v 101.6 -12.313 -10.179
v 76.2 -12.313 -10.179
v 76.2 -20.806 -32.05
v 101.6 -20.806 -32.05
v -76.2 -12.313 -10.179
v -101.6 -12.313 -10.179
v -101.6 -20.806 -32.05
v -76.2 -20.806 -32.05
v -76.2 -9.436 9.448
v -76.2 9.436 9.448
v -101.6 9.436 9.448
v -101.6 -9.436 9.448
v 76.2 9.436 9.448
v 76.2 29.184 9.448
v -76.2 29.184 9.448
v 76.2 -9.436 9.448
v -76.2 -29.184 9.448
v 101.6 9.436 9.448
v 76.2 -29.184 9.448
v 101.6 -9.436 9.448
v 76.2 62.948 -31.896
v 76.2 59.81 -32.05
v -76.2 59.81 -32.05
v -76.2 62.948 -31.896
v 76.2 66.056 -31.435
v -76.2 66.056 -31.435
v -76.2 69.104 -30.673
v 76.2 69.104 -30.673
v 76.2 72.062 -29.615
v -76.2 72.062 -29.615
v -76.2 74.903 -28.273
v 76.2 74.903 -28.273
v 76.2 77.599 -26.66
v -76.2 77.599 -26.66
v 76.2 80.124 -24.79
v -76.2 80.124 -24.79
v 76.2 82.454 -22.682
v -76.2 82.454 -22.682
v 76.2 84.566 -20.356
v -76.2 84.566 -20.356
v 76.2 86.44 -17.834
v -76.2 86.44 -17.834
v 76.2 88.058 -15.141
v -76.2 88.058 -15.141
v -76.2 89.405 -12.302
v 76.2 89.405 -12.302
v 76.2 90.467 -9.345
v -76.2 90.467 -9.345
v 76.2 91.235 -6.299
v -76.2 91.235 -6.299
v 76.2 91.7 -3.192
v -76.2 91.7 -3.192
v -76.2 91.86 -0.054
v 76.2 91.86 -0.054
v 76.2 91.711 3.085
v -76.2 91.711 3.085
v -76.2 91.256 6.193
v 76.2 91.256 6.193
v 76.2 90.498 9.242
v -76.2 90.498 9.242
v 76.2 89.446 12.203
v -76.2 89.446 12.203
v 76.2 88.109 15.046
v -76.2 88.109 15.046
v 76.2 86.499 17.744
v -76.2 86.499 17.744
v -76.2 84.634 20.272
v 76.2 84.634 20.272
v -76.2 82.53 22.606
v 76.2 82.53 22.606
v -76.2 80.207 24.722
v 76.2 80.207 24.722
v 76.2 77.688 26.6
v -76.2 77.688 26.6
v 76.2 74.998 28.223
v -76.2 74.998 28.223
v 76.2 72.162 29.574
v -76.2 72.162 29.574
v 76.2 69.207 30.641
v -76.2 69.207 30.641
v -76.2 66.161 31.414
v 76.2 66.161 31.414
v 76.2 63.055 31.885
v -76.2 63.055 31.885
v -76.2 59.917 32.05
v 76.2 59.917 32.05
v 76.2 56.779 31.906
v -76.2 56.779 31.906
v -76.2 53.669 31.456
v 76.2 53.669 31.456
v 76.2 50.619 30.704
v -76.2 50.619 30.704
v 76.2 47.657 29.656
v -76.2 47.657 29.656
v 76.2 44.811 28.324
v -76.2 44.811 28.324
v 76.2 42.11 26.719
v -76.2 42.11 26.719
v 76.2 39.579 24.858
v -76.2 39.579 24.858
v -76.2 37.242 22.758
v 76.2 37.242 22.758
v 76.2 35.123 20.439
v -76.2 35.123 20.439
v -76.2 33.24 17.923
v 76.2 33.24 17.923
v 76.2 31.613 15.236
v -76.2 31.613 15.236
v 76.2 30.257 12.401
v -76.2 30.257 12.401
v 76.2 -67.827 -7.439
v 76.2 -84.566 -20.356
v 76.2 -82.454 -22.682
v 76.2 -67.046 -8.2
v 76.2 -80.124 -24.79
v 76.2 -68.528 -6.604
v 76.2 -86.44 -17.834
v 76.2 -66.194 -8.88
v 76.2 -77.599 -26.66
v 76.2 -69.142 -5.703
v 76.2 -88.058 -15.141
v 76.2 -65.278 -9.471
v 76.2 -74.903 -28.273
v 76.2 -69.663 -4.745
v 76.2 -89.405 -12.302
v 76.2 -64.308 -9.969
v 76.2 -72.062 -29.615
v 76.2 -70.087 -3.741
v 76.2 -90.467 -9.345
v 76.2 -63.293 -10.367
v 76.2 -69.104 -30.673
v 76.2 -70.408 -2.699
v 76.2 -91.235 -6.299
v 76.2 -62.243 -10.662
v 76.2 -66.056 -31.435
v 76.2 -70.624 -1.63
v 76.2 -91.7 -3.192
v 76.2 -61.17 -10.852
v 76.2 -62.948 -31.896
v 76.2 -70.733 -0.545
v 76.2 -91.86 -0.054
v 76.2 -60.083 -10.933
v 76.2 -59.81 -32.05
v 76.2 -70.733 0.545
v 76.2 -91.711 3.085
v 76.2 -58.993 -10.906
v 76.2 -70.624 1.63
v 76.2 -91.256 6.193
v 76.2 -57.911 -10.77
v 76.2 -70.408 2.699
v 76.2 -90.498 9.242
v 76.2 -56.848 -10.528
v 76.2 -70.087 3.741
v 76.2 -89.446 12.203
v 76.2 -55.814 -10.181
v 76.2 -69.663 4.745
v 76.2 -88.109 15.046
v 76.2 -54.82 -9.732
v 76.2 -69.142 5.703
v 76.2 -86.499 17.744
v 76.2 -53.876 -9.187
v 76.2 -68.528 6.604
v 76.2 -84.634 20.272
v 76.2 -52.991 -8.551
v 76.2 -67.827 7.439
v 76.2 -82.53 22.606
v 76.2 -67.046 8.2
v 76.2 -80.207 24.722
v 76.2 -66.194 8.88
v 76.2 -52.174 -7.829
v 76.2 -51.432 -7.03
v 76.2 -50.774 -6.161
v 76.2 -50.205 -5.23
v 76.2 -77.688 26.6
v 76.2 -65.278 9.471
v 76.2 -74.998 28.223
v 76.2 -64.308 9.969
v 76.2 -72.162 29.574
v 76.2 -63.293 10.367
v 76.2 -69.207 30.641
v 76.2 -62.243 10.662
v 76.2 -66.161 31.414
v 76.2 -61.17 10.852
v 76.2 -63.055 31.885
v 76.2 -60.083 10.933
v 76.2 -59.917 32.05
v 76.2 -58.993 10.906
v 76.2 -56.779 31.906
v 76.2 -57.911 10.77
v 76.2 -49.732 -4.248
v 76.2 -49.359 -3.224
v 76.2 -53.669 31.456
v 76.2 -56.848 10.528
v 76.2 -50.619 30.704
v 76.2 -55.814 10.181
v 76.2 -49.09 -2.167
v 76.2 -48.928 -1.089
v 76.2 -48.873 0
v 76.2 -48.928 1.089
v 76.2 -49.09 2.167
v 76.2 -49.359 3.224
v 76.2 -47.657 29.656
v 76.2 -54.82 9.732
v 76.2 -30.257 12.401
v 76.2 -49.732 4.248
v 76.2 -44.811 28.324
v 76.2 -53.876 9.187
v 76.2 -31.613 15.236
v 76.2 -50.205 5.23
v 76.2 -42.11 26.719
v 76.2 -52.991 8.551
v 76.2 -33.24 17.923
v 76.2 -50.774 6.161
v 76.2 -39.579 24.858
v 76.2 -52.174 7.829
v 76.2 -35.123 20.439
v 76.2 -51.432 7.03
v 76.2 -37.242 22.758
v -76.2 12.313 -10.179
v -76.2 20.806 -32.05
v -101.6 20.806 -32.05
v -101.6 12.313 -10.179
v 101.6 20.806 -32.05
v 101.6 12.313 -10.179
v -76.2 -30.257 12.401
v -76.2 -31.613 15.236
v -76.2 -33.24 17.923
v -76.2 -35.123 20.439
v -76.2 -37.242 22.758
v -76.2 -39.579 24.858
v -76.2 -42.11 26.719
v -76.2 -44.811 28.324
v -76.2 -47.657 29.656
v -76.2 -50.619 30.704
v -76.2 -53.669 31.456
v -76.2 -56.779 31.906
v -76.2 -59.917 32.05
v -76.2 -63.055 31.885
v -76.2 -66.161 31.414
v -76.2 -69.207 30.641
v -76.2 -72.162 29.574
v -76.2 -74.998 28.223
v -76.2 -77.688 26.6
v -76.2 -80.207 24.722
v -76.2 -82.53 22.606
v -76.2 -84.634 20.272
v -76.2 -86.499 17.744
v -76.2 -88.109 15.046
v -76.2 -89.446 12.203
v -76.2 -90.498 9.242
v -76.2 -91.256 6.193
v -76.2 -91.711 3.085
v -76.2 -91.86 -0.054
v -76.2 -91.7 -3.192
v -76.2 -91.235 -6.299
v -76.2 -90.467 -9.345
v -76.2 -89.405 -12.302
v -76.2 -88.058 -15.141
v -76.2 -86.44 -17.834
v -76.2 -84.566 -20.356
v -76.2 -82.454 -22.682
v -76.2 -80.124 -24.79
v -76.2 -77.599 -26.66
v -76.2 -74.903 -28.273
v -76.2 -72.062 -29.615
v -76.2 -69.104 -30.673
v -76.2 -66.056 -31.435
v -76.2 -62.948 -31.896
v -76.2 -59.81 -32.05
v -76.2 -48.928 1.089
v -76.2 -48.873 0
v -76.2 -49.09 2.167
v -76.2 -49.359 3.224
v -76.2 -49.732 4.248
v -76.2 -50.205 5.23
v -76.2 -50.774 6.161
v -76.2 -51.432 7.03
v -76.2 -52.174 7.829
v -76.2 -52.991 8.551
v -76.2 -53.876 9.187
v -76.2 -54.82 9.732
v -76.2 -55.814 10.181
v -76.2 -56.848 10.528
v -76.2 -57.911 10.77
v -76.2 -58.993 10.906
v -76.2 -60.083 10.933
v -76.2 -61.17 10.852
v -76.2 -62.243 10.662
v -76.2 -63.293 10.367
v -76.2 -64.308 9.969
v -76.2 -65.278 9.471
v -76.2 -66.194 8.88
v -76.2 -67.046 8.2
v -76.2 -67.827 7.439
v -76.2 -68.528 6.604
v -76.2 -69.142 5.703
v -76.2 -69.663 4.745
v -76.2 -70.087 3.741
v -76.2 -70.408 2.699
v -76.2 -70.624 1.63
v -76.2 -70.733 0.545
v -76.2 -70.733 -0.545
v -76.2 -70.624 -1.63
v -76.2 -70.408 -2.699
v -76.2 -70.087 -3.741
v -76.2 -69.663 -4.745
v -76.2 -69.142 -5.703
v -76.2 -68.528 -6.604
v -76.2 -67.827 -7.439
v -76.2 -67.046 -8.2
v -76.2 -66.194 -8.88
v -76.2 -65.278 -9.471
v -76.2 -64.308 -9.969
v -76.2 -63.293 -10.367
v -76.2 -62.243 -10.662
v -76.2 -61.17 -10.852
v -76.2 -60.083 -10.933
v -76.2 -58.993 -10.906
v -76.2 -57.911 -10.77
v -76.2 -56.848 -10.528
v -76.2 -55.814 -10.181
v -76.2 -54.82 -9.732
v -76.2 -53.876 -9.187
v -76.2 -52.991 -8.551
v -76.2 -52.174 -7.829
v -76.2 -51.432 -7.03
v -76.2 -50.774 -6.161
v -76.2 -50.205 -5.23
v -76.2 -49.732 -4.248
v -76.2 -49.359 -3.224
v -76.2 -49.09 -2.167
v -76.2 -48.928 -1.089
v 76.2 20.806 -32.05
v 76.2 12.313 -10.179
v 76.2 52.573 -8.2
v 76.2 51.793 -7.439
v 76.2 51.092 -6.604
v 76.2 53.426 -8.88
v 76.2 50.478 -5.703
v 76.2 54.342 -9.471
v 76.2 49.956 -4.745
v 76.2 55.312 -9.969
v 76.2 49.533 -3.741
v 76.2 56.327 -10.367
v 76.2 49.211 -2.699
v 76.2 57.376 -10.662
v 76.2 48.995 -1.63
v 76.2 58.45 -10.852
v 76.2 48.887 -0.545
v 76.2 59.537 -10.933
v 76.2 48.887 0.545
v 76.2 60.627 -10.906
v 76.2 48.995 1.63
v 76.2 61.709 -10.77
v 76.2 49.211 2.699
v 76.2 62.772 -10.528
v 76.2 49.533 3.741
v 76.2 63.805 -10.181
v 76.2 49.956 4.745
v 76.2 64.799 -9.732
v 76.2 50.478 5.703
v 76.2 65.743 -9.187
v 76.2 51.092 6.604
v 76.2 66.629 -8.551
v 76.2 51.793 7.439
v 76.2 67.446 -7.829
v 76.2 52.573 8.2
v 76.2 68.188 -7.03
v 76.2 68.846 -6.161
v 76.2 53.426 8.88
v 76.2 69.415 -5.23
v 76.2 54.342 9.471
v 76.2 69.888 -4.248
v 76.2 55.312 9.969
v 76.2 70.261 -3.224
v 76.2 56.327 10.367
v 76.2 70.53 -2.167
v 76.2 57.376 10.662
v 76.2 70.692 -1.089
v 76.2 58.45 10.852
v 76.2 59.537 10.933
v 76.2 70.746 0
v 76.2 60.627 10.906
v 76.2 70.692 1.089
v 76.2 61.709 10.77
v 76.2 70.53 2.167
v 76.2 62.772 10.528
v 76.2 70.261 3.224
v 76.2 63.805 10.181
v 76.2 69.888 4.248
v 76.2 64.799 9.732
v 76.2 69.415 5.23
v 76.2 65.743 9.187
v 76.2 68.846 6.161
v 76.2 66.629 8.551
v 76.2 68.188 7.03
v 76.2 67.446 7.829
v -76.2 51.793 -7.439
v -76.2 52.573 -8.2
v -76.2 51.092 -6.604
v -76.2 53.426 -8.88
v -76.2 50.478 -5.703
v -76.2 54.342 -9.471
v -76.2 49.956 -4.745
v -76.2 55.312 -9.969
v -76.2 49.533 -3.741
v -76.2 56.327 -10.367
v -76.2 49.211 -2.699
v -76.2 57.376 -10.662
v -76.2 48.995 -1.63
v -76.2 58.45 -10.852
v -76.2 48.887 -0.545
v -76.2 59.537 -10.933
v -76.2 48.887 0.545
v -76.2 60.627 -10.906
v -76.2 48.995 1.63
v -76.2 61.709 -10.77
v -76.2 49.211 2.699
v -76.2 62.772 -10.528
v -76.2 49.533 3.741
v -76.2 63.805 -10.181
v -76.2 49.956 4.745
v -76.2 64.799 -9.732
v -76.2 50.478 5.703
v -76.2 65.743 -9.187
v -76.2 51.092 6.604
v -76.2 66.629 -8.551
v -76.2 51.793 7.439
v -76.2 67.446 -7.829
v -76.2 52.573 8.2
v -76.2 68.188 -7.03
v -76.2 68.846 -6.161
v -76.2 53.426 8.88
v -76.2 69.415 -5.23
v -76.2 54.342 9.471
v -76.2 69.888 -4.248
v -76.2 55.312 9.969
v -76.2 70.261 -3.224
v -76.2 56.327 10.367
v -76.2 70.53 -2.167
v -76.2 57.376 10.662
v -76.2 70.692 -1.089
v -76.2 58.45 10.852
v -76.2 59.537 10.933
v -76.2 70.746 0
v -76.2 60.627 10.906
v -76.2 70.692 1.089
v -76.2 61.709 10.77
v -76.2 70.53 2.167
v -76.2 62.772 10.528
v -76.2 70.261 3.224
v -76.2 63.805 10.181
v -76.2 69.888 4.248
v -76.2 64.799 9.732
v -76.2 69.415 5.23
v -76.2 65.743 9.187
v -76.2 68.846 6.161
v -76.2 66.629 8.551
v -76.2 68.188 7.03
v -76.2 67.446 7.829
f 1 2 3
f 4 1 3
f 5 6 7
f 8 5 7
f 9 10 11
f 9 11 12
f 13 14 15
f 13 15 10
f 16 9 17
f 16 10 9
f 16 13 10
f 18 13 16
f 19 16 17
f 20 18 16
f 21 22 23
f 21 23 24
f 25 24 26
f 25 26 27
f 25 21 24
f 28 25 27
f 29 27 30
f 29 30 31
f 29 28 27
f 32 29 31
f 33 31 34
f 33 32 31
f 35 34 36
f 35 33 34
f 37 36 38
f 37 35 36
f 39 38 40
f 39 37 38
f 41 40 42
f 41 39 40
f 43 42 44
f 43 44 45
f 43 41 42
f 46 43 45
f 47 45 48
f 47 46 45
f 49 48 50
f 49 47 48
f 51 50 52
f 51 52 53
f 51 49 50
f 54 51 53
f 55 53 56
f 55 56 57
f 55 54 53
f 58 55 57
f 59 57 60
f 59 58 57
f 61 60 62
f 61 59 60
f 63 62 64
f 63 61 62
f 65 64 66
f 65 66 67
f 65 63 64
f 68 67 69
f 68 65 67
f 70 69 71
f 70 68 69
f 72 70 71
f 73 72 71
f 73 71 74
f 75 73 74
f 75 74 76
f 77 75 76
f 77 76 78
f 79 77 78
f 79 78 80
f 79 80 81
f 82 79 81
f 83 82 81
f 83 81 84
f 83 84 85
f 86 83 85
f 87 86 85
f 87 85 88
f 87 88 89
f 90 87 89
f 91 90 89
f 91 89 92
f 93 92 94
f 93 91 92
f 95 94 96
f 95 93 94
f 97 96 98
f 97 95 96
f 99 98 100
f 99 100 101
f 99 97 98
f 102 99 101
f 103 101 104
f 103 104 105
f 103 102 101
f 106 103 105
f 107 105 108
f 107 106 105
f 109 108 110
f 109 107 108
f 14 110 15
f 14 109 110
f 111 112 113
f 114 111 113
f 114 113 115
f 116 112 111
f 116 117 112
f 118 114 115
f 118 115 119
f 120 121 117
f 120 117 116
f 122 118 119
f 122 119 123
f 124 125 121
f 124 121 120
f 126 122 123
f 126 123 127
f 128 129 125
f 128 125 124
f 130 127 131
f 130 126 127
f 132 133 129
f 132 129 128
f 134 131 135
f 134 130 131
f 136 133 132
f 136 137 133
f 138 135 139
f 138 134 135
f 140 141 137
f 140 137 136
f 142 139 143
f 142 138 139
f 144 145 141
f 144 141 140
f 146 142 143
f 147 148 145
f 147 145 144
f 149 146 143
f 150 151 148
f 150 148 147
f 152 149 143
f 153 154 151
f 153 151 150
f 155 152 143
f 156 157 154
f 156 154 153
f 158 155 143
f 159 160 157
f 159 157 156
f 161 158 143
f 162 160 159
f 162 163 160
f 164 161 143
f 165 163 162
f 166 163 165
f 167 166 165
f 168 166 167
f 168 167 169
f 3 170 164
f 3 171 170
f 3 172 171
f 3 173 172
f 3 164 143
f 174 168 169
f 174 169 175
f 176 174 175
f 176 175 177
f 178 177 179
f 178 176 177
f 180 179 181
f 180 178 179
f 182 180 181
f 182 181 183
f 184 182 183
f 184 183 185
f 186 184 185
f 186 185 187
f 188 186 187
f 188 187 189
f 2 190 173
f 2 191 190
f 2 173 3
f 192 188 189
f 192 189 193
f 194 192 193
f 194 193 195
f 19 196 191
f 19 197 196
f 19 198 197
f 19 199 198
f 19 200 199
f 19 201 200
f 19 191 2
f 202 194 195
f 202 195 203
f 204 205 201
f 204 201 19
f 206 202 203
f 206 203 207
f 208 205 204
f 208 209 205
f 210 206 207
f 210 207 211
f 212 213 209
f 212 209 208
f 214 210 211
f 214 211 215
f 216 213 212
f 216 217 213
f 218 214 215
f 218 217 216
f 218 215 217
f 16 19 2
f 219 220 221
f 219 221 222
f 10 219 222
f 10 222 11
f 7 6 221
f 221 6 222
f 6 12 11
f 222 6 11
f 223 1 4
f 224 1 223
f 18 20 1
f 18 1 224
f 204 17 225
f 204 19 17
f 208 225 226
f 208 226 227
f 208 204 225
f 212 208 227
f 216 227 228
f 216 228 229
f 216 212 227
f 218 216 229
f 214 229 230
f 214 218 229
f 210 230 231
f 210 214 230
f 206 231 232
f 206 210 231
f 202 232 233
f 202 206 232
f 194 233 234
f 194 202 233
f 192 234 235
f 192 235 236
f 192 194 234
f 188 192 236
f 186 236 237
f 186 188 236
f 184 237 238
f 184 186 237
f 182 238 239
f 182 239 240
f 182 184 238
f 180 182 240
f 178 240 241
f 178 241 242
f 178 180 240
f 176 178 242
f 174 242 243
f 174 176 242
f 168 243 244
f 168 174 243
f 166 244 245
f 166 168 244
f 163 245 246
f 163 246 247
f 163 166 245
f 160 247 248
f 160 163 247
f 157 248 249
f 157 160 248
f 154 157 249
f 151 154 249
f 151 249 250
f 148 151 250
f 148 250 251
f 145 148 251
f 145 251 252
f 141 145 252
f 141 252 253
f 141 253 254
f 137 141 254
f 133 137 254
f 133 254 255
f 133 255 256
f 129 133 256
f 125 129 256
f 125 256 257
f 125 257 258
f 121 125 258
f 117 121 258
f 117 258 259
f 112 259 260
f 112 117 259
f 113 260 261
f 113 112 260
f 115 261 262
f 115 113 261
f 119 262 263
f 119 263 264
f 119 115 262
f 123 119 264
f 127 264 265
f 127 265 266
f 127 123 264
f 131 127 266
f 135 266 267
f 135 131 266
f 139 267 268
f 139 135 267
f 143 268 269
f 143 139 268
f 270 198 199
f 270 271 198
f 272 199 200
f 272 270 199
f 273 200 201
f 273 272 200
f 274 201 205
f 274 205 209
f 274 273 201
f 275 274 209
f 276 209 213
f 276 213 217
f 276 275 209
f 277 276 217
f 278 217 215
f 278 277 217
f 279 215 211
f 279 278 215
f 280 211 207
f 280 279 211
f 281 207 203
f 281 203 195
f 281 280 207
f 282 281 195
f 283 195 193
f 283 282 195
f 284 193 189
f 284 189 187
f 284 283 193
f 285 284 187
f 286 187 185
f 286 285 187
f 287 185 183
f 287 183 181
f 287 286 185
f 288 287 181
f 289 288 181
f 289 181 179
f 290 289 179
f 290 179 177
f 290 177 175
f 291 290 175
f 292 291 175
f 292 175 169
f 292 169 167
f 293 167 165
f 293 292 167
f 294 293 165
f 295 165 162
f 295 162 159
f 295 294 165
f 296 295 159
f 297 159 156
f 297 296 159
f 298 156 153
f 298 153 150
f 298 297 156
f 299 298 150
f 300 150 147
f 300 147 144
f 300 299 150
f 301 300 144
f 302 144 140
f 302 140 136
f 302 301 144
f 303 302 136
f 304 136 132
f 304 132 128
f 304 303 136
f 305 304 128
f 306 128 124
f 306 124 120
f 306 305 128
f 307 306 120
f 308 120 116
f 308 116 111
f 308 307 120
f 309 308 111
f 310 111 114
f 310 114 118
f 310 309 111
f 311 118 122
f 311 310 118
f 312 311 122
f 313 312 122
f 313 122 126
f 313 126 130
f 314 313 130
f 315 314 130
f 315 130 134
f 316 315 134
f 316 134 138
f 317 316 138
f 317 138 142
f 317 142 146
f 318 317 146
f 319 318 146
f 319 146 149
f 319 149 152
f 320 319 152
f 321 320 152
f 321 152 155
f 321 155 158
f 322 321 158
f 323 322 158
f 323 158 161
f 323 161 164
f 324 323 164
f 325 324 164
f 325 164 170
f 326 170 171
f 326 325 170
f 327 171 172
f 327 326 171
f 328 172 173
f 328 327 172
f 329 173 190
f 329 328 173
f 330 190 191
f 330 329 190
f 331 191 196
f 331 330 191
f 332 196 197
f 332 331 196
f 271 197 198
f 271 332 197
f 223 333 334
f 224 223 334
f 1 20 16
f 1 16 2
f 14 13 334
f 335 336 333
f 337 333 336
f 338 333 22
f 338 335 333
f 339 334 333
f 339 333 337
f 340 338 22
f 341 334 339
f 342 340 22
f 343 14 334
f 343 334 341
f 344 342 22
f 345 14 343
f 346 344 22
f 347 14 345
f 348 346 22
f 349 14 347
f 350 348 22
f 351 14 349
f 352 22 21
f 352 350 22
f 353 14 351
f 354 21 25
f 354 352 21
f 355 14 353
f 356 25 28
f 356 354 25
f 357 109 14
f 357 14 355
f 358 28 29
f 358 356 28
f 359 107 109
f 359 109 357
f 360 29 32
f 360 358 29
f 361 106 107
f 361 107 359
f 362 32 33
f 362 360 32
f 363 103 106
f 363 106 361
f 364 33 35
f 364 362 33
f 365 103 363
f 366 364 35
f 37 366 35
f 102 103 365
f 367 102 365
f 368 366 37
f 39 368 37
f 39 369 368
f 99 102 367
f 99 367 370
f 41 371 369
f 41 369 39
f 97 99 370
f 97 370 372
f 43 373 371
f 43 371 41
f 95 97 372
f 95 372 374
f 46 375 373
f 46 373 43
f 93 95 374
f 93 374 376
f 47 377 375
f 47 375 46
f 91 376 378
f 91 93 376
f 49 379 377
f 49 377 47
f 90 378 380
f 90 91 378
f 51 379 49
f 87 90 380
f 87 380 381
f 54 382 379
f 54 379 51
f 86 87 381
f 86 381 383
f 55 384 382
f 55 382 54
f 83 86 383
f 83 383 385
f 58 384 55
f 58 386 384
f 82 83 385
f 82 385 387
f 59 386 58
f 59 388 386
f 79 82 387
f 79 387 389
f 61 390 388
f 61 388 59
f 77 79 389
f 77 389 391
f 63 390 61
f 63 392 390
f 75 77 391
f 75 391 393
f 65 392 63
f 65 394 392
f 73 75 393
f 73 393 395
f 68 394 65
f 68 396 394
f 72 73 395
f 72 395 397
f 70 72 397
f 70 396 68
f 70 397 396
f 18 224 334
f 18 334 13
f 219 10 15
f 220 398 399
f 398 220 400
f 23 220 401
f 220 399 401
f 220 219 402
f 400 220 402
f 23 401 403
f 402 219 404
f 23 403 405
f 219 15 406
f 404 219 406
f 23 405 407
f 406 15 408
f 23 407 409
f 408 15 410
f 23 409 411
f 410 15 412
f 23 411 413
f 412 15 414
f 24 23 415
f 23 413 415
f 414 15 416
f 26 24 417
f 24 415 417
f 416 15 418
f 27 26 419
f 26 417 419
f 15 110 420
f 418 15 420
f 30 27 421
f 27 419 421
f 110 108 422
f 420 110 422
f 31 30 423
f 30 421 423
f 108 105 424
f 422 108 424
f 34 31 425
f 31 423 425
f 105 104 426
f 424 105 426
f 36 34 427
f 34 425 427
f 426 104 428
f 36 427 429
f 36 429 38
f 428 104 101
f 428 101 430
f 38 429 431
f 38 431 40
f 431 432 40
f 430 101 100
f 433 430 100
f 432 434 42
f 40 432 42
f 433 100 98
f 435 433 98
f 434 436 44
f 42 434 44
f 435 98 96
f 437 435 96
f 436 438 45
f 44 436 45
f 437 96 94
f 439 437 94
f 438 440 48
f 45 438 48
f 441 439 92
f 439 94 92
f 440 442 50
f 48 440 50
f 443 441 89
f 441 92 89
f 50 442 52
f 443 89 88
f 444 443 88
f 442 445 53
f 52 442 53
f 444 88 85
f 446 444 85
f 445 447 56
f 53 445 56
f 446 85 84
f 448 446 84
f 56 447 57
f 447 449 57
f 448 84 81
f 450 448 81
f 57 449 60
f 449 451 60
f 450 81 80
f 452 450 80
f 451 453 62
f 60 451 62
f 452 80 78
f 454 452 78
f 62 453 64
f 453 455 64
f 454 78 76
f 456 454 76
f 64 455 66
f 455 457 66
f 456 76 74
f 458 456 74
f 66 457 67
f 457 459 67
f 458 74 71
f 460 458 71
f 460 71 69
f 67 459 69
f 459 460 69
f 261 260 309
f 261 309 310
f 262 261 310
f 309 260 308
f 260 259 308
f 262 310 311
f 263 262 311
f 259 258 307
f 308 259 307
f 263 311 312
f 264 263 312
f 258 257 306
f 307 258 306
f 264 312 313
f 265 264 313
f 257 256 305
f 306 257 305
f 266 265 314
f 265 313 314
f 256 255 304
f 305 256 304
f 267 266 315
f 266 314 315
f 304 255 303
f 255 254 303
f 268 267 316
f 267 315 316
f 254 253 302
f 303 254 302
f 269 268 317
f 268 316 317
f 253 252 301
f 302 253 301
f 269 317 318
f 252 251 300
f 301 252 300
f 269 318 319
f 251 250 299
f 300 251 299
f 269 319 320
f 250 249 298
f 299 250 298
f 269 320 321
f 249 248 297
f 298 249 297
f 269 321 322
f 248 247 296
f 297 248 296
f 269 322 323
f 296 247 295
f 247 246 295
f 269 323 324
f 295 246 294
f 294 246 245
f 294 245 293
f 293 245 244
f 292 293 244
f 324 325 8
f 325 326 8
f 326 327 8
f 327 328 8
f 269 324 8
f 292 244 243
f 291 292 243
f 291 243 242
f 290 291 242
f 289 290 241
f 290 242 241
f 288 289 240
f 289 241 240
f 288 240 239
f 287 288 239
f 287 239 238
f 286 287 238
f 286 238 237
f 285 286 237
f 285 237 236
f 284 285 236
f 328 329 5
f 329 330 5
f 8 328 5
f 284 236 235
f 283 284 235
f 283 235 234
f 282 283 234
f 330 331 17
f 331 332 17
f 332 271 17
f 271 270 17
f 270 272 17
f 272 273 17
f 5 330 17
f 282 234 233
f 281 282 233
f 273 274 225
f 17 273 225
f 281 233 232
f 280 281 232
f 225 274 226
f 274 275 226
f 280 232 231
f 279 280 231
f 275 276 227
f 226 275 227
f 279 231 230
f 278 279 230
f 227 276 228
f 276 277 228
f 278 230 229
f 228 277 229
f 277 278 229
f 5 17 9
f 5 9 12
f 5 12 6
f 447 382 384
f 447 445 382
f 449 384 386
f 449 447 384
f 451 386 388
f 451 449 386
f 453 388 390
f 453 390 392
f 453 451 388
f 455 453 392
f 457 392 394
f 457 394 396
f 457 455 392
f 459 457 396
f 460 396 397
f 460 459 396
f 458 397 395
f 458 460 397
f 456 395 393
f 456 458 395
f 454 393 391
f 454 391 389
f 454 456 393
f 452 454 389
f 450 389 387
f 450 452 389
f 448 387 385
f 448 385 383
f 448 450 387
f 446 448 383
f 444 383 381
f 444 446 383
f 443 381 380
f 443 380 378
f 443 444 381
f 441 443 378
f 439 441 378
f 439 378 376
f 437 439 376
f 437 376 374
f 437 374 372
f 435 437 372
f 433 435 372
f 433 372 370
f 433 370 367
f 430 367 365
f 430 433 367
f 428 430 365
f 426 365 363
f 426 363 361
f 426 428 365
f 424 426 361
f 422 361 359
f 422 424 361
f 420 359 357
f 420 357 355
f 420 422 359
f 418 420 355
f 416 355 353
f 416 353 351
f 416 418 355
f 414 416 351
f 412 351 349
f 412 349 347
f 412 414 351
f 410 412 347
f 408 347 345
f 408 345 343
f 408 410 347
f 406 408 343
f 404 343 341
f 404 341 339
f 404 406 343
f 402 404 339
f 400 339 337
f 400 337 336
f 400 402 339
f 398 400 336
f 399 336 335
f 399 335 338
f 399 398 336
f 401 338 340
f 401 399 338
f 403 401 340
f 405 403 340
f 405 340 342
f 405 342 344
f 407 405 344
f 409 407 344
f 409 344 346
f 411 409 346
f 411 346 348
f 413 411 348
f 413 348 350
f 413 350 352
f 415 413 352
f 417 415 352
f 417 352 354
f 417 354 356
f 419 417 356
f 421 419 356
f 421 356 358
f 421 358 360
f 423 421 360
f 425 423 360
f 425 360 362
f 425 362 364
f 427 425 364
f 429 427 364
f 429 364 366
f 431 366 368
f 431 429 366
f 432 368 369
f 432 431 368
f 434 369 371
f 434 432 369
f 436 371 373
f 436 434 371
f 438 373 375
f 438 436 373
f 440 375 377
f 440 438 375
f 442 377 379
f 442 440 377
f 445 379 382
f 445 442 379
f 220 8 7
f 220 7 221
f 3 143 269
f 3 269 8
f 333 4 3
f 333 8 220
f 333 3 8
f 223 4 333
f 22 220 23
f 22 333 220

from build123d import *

# Parameters (mm, degrees)
F0_R     = 10.93658
F1_DEPTH = 76.2
F2_DEPTH = 101.6


with BuildPart() as f1:
    # F0 (on Right) → F1 (new body, symmetric)
    with BuildSketch(Plane.YZ):
        Polygon((-12.313237, -10.17919), (-20.806385, -32.049883), (20.806385, -32.049883), (12.313237, -10.17919), align=None)
        with BuildLine():
            ThreePointArc((-29.184296, 9.448227), (-85.59756, 19.031296), (-59.809873, -32.049883))
            Line((-59.809873, -32.049883), (-20.806385, -32.049883))
            Line((-20.806385, -32.049883), (-12.313237, -10.17919))
            Line((-12.313237, -10.17919), (-9.436439, 9.448227))
            Line((-9.436439, 9.448227), (-29.184296, 9.448227))
        make_face()
        with Locations((-59.809873, 0)):
            Circle(F0_R, mode=Mode.SUBTRACT)
        Polygon((-9.436439, 9.448227), (-12.313237, -10.17919), (12.313237, -10.17919), (9.436439, 9.448227), align=None)
        with BuildLine():
            Line((12.313237, -10.17919), (20.806385, -32.049883))
            Line((20.806385, -32.049883), (59.809873, -32.049883))
            ThreePointArc((59.809873, -32.049883), (85.59756, 19.031296), (29.184296, 9.448227))
            Line((29.184296, 9.448227), (9.436439, 9.448227))
            Line((9.436439, 9.448227), (12.313237, -10.17919))
        make_face()
        with Locations((59.809873, 0)):
            Circle(F0_R, mode=Mode.SUBTRACT)
    extrude(amount=F1_DEPTH, both=True)

    # F0 (on Right) → F2 (join, symmetric)
    with BuildSketch(Plane.YZ):
        Polygon((-12.313237, -10.17919), (-20.806385, -32.049883), (20.806385, -32.049883), (12.313237, -10.17919), align=None)
        Polygon((-9.436439, 9.448227), (-12.313237, -10.17919), (12.313237, -10.17919), (9.436439, 9.448227), align=None)
    extrude(amount=F2_DEPTH, both=True)


solid = f1.part
